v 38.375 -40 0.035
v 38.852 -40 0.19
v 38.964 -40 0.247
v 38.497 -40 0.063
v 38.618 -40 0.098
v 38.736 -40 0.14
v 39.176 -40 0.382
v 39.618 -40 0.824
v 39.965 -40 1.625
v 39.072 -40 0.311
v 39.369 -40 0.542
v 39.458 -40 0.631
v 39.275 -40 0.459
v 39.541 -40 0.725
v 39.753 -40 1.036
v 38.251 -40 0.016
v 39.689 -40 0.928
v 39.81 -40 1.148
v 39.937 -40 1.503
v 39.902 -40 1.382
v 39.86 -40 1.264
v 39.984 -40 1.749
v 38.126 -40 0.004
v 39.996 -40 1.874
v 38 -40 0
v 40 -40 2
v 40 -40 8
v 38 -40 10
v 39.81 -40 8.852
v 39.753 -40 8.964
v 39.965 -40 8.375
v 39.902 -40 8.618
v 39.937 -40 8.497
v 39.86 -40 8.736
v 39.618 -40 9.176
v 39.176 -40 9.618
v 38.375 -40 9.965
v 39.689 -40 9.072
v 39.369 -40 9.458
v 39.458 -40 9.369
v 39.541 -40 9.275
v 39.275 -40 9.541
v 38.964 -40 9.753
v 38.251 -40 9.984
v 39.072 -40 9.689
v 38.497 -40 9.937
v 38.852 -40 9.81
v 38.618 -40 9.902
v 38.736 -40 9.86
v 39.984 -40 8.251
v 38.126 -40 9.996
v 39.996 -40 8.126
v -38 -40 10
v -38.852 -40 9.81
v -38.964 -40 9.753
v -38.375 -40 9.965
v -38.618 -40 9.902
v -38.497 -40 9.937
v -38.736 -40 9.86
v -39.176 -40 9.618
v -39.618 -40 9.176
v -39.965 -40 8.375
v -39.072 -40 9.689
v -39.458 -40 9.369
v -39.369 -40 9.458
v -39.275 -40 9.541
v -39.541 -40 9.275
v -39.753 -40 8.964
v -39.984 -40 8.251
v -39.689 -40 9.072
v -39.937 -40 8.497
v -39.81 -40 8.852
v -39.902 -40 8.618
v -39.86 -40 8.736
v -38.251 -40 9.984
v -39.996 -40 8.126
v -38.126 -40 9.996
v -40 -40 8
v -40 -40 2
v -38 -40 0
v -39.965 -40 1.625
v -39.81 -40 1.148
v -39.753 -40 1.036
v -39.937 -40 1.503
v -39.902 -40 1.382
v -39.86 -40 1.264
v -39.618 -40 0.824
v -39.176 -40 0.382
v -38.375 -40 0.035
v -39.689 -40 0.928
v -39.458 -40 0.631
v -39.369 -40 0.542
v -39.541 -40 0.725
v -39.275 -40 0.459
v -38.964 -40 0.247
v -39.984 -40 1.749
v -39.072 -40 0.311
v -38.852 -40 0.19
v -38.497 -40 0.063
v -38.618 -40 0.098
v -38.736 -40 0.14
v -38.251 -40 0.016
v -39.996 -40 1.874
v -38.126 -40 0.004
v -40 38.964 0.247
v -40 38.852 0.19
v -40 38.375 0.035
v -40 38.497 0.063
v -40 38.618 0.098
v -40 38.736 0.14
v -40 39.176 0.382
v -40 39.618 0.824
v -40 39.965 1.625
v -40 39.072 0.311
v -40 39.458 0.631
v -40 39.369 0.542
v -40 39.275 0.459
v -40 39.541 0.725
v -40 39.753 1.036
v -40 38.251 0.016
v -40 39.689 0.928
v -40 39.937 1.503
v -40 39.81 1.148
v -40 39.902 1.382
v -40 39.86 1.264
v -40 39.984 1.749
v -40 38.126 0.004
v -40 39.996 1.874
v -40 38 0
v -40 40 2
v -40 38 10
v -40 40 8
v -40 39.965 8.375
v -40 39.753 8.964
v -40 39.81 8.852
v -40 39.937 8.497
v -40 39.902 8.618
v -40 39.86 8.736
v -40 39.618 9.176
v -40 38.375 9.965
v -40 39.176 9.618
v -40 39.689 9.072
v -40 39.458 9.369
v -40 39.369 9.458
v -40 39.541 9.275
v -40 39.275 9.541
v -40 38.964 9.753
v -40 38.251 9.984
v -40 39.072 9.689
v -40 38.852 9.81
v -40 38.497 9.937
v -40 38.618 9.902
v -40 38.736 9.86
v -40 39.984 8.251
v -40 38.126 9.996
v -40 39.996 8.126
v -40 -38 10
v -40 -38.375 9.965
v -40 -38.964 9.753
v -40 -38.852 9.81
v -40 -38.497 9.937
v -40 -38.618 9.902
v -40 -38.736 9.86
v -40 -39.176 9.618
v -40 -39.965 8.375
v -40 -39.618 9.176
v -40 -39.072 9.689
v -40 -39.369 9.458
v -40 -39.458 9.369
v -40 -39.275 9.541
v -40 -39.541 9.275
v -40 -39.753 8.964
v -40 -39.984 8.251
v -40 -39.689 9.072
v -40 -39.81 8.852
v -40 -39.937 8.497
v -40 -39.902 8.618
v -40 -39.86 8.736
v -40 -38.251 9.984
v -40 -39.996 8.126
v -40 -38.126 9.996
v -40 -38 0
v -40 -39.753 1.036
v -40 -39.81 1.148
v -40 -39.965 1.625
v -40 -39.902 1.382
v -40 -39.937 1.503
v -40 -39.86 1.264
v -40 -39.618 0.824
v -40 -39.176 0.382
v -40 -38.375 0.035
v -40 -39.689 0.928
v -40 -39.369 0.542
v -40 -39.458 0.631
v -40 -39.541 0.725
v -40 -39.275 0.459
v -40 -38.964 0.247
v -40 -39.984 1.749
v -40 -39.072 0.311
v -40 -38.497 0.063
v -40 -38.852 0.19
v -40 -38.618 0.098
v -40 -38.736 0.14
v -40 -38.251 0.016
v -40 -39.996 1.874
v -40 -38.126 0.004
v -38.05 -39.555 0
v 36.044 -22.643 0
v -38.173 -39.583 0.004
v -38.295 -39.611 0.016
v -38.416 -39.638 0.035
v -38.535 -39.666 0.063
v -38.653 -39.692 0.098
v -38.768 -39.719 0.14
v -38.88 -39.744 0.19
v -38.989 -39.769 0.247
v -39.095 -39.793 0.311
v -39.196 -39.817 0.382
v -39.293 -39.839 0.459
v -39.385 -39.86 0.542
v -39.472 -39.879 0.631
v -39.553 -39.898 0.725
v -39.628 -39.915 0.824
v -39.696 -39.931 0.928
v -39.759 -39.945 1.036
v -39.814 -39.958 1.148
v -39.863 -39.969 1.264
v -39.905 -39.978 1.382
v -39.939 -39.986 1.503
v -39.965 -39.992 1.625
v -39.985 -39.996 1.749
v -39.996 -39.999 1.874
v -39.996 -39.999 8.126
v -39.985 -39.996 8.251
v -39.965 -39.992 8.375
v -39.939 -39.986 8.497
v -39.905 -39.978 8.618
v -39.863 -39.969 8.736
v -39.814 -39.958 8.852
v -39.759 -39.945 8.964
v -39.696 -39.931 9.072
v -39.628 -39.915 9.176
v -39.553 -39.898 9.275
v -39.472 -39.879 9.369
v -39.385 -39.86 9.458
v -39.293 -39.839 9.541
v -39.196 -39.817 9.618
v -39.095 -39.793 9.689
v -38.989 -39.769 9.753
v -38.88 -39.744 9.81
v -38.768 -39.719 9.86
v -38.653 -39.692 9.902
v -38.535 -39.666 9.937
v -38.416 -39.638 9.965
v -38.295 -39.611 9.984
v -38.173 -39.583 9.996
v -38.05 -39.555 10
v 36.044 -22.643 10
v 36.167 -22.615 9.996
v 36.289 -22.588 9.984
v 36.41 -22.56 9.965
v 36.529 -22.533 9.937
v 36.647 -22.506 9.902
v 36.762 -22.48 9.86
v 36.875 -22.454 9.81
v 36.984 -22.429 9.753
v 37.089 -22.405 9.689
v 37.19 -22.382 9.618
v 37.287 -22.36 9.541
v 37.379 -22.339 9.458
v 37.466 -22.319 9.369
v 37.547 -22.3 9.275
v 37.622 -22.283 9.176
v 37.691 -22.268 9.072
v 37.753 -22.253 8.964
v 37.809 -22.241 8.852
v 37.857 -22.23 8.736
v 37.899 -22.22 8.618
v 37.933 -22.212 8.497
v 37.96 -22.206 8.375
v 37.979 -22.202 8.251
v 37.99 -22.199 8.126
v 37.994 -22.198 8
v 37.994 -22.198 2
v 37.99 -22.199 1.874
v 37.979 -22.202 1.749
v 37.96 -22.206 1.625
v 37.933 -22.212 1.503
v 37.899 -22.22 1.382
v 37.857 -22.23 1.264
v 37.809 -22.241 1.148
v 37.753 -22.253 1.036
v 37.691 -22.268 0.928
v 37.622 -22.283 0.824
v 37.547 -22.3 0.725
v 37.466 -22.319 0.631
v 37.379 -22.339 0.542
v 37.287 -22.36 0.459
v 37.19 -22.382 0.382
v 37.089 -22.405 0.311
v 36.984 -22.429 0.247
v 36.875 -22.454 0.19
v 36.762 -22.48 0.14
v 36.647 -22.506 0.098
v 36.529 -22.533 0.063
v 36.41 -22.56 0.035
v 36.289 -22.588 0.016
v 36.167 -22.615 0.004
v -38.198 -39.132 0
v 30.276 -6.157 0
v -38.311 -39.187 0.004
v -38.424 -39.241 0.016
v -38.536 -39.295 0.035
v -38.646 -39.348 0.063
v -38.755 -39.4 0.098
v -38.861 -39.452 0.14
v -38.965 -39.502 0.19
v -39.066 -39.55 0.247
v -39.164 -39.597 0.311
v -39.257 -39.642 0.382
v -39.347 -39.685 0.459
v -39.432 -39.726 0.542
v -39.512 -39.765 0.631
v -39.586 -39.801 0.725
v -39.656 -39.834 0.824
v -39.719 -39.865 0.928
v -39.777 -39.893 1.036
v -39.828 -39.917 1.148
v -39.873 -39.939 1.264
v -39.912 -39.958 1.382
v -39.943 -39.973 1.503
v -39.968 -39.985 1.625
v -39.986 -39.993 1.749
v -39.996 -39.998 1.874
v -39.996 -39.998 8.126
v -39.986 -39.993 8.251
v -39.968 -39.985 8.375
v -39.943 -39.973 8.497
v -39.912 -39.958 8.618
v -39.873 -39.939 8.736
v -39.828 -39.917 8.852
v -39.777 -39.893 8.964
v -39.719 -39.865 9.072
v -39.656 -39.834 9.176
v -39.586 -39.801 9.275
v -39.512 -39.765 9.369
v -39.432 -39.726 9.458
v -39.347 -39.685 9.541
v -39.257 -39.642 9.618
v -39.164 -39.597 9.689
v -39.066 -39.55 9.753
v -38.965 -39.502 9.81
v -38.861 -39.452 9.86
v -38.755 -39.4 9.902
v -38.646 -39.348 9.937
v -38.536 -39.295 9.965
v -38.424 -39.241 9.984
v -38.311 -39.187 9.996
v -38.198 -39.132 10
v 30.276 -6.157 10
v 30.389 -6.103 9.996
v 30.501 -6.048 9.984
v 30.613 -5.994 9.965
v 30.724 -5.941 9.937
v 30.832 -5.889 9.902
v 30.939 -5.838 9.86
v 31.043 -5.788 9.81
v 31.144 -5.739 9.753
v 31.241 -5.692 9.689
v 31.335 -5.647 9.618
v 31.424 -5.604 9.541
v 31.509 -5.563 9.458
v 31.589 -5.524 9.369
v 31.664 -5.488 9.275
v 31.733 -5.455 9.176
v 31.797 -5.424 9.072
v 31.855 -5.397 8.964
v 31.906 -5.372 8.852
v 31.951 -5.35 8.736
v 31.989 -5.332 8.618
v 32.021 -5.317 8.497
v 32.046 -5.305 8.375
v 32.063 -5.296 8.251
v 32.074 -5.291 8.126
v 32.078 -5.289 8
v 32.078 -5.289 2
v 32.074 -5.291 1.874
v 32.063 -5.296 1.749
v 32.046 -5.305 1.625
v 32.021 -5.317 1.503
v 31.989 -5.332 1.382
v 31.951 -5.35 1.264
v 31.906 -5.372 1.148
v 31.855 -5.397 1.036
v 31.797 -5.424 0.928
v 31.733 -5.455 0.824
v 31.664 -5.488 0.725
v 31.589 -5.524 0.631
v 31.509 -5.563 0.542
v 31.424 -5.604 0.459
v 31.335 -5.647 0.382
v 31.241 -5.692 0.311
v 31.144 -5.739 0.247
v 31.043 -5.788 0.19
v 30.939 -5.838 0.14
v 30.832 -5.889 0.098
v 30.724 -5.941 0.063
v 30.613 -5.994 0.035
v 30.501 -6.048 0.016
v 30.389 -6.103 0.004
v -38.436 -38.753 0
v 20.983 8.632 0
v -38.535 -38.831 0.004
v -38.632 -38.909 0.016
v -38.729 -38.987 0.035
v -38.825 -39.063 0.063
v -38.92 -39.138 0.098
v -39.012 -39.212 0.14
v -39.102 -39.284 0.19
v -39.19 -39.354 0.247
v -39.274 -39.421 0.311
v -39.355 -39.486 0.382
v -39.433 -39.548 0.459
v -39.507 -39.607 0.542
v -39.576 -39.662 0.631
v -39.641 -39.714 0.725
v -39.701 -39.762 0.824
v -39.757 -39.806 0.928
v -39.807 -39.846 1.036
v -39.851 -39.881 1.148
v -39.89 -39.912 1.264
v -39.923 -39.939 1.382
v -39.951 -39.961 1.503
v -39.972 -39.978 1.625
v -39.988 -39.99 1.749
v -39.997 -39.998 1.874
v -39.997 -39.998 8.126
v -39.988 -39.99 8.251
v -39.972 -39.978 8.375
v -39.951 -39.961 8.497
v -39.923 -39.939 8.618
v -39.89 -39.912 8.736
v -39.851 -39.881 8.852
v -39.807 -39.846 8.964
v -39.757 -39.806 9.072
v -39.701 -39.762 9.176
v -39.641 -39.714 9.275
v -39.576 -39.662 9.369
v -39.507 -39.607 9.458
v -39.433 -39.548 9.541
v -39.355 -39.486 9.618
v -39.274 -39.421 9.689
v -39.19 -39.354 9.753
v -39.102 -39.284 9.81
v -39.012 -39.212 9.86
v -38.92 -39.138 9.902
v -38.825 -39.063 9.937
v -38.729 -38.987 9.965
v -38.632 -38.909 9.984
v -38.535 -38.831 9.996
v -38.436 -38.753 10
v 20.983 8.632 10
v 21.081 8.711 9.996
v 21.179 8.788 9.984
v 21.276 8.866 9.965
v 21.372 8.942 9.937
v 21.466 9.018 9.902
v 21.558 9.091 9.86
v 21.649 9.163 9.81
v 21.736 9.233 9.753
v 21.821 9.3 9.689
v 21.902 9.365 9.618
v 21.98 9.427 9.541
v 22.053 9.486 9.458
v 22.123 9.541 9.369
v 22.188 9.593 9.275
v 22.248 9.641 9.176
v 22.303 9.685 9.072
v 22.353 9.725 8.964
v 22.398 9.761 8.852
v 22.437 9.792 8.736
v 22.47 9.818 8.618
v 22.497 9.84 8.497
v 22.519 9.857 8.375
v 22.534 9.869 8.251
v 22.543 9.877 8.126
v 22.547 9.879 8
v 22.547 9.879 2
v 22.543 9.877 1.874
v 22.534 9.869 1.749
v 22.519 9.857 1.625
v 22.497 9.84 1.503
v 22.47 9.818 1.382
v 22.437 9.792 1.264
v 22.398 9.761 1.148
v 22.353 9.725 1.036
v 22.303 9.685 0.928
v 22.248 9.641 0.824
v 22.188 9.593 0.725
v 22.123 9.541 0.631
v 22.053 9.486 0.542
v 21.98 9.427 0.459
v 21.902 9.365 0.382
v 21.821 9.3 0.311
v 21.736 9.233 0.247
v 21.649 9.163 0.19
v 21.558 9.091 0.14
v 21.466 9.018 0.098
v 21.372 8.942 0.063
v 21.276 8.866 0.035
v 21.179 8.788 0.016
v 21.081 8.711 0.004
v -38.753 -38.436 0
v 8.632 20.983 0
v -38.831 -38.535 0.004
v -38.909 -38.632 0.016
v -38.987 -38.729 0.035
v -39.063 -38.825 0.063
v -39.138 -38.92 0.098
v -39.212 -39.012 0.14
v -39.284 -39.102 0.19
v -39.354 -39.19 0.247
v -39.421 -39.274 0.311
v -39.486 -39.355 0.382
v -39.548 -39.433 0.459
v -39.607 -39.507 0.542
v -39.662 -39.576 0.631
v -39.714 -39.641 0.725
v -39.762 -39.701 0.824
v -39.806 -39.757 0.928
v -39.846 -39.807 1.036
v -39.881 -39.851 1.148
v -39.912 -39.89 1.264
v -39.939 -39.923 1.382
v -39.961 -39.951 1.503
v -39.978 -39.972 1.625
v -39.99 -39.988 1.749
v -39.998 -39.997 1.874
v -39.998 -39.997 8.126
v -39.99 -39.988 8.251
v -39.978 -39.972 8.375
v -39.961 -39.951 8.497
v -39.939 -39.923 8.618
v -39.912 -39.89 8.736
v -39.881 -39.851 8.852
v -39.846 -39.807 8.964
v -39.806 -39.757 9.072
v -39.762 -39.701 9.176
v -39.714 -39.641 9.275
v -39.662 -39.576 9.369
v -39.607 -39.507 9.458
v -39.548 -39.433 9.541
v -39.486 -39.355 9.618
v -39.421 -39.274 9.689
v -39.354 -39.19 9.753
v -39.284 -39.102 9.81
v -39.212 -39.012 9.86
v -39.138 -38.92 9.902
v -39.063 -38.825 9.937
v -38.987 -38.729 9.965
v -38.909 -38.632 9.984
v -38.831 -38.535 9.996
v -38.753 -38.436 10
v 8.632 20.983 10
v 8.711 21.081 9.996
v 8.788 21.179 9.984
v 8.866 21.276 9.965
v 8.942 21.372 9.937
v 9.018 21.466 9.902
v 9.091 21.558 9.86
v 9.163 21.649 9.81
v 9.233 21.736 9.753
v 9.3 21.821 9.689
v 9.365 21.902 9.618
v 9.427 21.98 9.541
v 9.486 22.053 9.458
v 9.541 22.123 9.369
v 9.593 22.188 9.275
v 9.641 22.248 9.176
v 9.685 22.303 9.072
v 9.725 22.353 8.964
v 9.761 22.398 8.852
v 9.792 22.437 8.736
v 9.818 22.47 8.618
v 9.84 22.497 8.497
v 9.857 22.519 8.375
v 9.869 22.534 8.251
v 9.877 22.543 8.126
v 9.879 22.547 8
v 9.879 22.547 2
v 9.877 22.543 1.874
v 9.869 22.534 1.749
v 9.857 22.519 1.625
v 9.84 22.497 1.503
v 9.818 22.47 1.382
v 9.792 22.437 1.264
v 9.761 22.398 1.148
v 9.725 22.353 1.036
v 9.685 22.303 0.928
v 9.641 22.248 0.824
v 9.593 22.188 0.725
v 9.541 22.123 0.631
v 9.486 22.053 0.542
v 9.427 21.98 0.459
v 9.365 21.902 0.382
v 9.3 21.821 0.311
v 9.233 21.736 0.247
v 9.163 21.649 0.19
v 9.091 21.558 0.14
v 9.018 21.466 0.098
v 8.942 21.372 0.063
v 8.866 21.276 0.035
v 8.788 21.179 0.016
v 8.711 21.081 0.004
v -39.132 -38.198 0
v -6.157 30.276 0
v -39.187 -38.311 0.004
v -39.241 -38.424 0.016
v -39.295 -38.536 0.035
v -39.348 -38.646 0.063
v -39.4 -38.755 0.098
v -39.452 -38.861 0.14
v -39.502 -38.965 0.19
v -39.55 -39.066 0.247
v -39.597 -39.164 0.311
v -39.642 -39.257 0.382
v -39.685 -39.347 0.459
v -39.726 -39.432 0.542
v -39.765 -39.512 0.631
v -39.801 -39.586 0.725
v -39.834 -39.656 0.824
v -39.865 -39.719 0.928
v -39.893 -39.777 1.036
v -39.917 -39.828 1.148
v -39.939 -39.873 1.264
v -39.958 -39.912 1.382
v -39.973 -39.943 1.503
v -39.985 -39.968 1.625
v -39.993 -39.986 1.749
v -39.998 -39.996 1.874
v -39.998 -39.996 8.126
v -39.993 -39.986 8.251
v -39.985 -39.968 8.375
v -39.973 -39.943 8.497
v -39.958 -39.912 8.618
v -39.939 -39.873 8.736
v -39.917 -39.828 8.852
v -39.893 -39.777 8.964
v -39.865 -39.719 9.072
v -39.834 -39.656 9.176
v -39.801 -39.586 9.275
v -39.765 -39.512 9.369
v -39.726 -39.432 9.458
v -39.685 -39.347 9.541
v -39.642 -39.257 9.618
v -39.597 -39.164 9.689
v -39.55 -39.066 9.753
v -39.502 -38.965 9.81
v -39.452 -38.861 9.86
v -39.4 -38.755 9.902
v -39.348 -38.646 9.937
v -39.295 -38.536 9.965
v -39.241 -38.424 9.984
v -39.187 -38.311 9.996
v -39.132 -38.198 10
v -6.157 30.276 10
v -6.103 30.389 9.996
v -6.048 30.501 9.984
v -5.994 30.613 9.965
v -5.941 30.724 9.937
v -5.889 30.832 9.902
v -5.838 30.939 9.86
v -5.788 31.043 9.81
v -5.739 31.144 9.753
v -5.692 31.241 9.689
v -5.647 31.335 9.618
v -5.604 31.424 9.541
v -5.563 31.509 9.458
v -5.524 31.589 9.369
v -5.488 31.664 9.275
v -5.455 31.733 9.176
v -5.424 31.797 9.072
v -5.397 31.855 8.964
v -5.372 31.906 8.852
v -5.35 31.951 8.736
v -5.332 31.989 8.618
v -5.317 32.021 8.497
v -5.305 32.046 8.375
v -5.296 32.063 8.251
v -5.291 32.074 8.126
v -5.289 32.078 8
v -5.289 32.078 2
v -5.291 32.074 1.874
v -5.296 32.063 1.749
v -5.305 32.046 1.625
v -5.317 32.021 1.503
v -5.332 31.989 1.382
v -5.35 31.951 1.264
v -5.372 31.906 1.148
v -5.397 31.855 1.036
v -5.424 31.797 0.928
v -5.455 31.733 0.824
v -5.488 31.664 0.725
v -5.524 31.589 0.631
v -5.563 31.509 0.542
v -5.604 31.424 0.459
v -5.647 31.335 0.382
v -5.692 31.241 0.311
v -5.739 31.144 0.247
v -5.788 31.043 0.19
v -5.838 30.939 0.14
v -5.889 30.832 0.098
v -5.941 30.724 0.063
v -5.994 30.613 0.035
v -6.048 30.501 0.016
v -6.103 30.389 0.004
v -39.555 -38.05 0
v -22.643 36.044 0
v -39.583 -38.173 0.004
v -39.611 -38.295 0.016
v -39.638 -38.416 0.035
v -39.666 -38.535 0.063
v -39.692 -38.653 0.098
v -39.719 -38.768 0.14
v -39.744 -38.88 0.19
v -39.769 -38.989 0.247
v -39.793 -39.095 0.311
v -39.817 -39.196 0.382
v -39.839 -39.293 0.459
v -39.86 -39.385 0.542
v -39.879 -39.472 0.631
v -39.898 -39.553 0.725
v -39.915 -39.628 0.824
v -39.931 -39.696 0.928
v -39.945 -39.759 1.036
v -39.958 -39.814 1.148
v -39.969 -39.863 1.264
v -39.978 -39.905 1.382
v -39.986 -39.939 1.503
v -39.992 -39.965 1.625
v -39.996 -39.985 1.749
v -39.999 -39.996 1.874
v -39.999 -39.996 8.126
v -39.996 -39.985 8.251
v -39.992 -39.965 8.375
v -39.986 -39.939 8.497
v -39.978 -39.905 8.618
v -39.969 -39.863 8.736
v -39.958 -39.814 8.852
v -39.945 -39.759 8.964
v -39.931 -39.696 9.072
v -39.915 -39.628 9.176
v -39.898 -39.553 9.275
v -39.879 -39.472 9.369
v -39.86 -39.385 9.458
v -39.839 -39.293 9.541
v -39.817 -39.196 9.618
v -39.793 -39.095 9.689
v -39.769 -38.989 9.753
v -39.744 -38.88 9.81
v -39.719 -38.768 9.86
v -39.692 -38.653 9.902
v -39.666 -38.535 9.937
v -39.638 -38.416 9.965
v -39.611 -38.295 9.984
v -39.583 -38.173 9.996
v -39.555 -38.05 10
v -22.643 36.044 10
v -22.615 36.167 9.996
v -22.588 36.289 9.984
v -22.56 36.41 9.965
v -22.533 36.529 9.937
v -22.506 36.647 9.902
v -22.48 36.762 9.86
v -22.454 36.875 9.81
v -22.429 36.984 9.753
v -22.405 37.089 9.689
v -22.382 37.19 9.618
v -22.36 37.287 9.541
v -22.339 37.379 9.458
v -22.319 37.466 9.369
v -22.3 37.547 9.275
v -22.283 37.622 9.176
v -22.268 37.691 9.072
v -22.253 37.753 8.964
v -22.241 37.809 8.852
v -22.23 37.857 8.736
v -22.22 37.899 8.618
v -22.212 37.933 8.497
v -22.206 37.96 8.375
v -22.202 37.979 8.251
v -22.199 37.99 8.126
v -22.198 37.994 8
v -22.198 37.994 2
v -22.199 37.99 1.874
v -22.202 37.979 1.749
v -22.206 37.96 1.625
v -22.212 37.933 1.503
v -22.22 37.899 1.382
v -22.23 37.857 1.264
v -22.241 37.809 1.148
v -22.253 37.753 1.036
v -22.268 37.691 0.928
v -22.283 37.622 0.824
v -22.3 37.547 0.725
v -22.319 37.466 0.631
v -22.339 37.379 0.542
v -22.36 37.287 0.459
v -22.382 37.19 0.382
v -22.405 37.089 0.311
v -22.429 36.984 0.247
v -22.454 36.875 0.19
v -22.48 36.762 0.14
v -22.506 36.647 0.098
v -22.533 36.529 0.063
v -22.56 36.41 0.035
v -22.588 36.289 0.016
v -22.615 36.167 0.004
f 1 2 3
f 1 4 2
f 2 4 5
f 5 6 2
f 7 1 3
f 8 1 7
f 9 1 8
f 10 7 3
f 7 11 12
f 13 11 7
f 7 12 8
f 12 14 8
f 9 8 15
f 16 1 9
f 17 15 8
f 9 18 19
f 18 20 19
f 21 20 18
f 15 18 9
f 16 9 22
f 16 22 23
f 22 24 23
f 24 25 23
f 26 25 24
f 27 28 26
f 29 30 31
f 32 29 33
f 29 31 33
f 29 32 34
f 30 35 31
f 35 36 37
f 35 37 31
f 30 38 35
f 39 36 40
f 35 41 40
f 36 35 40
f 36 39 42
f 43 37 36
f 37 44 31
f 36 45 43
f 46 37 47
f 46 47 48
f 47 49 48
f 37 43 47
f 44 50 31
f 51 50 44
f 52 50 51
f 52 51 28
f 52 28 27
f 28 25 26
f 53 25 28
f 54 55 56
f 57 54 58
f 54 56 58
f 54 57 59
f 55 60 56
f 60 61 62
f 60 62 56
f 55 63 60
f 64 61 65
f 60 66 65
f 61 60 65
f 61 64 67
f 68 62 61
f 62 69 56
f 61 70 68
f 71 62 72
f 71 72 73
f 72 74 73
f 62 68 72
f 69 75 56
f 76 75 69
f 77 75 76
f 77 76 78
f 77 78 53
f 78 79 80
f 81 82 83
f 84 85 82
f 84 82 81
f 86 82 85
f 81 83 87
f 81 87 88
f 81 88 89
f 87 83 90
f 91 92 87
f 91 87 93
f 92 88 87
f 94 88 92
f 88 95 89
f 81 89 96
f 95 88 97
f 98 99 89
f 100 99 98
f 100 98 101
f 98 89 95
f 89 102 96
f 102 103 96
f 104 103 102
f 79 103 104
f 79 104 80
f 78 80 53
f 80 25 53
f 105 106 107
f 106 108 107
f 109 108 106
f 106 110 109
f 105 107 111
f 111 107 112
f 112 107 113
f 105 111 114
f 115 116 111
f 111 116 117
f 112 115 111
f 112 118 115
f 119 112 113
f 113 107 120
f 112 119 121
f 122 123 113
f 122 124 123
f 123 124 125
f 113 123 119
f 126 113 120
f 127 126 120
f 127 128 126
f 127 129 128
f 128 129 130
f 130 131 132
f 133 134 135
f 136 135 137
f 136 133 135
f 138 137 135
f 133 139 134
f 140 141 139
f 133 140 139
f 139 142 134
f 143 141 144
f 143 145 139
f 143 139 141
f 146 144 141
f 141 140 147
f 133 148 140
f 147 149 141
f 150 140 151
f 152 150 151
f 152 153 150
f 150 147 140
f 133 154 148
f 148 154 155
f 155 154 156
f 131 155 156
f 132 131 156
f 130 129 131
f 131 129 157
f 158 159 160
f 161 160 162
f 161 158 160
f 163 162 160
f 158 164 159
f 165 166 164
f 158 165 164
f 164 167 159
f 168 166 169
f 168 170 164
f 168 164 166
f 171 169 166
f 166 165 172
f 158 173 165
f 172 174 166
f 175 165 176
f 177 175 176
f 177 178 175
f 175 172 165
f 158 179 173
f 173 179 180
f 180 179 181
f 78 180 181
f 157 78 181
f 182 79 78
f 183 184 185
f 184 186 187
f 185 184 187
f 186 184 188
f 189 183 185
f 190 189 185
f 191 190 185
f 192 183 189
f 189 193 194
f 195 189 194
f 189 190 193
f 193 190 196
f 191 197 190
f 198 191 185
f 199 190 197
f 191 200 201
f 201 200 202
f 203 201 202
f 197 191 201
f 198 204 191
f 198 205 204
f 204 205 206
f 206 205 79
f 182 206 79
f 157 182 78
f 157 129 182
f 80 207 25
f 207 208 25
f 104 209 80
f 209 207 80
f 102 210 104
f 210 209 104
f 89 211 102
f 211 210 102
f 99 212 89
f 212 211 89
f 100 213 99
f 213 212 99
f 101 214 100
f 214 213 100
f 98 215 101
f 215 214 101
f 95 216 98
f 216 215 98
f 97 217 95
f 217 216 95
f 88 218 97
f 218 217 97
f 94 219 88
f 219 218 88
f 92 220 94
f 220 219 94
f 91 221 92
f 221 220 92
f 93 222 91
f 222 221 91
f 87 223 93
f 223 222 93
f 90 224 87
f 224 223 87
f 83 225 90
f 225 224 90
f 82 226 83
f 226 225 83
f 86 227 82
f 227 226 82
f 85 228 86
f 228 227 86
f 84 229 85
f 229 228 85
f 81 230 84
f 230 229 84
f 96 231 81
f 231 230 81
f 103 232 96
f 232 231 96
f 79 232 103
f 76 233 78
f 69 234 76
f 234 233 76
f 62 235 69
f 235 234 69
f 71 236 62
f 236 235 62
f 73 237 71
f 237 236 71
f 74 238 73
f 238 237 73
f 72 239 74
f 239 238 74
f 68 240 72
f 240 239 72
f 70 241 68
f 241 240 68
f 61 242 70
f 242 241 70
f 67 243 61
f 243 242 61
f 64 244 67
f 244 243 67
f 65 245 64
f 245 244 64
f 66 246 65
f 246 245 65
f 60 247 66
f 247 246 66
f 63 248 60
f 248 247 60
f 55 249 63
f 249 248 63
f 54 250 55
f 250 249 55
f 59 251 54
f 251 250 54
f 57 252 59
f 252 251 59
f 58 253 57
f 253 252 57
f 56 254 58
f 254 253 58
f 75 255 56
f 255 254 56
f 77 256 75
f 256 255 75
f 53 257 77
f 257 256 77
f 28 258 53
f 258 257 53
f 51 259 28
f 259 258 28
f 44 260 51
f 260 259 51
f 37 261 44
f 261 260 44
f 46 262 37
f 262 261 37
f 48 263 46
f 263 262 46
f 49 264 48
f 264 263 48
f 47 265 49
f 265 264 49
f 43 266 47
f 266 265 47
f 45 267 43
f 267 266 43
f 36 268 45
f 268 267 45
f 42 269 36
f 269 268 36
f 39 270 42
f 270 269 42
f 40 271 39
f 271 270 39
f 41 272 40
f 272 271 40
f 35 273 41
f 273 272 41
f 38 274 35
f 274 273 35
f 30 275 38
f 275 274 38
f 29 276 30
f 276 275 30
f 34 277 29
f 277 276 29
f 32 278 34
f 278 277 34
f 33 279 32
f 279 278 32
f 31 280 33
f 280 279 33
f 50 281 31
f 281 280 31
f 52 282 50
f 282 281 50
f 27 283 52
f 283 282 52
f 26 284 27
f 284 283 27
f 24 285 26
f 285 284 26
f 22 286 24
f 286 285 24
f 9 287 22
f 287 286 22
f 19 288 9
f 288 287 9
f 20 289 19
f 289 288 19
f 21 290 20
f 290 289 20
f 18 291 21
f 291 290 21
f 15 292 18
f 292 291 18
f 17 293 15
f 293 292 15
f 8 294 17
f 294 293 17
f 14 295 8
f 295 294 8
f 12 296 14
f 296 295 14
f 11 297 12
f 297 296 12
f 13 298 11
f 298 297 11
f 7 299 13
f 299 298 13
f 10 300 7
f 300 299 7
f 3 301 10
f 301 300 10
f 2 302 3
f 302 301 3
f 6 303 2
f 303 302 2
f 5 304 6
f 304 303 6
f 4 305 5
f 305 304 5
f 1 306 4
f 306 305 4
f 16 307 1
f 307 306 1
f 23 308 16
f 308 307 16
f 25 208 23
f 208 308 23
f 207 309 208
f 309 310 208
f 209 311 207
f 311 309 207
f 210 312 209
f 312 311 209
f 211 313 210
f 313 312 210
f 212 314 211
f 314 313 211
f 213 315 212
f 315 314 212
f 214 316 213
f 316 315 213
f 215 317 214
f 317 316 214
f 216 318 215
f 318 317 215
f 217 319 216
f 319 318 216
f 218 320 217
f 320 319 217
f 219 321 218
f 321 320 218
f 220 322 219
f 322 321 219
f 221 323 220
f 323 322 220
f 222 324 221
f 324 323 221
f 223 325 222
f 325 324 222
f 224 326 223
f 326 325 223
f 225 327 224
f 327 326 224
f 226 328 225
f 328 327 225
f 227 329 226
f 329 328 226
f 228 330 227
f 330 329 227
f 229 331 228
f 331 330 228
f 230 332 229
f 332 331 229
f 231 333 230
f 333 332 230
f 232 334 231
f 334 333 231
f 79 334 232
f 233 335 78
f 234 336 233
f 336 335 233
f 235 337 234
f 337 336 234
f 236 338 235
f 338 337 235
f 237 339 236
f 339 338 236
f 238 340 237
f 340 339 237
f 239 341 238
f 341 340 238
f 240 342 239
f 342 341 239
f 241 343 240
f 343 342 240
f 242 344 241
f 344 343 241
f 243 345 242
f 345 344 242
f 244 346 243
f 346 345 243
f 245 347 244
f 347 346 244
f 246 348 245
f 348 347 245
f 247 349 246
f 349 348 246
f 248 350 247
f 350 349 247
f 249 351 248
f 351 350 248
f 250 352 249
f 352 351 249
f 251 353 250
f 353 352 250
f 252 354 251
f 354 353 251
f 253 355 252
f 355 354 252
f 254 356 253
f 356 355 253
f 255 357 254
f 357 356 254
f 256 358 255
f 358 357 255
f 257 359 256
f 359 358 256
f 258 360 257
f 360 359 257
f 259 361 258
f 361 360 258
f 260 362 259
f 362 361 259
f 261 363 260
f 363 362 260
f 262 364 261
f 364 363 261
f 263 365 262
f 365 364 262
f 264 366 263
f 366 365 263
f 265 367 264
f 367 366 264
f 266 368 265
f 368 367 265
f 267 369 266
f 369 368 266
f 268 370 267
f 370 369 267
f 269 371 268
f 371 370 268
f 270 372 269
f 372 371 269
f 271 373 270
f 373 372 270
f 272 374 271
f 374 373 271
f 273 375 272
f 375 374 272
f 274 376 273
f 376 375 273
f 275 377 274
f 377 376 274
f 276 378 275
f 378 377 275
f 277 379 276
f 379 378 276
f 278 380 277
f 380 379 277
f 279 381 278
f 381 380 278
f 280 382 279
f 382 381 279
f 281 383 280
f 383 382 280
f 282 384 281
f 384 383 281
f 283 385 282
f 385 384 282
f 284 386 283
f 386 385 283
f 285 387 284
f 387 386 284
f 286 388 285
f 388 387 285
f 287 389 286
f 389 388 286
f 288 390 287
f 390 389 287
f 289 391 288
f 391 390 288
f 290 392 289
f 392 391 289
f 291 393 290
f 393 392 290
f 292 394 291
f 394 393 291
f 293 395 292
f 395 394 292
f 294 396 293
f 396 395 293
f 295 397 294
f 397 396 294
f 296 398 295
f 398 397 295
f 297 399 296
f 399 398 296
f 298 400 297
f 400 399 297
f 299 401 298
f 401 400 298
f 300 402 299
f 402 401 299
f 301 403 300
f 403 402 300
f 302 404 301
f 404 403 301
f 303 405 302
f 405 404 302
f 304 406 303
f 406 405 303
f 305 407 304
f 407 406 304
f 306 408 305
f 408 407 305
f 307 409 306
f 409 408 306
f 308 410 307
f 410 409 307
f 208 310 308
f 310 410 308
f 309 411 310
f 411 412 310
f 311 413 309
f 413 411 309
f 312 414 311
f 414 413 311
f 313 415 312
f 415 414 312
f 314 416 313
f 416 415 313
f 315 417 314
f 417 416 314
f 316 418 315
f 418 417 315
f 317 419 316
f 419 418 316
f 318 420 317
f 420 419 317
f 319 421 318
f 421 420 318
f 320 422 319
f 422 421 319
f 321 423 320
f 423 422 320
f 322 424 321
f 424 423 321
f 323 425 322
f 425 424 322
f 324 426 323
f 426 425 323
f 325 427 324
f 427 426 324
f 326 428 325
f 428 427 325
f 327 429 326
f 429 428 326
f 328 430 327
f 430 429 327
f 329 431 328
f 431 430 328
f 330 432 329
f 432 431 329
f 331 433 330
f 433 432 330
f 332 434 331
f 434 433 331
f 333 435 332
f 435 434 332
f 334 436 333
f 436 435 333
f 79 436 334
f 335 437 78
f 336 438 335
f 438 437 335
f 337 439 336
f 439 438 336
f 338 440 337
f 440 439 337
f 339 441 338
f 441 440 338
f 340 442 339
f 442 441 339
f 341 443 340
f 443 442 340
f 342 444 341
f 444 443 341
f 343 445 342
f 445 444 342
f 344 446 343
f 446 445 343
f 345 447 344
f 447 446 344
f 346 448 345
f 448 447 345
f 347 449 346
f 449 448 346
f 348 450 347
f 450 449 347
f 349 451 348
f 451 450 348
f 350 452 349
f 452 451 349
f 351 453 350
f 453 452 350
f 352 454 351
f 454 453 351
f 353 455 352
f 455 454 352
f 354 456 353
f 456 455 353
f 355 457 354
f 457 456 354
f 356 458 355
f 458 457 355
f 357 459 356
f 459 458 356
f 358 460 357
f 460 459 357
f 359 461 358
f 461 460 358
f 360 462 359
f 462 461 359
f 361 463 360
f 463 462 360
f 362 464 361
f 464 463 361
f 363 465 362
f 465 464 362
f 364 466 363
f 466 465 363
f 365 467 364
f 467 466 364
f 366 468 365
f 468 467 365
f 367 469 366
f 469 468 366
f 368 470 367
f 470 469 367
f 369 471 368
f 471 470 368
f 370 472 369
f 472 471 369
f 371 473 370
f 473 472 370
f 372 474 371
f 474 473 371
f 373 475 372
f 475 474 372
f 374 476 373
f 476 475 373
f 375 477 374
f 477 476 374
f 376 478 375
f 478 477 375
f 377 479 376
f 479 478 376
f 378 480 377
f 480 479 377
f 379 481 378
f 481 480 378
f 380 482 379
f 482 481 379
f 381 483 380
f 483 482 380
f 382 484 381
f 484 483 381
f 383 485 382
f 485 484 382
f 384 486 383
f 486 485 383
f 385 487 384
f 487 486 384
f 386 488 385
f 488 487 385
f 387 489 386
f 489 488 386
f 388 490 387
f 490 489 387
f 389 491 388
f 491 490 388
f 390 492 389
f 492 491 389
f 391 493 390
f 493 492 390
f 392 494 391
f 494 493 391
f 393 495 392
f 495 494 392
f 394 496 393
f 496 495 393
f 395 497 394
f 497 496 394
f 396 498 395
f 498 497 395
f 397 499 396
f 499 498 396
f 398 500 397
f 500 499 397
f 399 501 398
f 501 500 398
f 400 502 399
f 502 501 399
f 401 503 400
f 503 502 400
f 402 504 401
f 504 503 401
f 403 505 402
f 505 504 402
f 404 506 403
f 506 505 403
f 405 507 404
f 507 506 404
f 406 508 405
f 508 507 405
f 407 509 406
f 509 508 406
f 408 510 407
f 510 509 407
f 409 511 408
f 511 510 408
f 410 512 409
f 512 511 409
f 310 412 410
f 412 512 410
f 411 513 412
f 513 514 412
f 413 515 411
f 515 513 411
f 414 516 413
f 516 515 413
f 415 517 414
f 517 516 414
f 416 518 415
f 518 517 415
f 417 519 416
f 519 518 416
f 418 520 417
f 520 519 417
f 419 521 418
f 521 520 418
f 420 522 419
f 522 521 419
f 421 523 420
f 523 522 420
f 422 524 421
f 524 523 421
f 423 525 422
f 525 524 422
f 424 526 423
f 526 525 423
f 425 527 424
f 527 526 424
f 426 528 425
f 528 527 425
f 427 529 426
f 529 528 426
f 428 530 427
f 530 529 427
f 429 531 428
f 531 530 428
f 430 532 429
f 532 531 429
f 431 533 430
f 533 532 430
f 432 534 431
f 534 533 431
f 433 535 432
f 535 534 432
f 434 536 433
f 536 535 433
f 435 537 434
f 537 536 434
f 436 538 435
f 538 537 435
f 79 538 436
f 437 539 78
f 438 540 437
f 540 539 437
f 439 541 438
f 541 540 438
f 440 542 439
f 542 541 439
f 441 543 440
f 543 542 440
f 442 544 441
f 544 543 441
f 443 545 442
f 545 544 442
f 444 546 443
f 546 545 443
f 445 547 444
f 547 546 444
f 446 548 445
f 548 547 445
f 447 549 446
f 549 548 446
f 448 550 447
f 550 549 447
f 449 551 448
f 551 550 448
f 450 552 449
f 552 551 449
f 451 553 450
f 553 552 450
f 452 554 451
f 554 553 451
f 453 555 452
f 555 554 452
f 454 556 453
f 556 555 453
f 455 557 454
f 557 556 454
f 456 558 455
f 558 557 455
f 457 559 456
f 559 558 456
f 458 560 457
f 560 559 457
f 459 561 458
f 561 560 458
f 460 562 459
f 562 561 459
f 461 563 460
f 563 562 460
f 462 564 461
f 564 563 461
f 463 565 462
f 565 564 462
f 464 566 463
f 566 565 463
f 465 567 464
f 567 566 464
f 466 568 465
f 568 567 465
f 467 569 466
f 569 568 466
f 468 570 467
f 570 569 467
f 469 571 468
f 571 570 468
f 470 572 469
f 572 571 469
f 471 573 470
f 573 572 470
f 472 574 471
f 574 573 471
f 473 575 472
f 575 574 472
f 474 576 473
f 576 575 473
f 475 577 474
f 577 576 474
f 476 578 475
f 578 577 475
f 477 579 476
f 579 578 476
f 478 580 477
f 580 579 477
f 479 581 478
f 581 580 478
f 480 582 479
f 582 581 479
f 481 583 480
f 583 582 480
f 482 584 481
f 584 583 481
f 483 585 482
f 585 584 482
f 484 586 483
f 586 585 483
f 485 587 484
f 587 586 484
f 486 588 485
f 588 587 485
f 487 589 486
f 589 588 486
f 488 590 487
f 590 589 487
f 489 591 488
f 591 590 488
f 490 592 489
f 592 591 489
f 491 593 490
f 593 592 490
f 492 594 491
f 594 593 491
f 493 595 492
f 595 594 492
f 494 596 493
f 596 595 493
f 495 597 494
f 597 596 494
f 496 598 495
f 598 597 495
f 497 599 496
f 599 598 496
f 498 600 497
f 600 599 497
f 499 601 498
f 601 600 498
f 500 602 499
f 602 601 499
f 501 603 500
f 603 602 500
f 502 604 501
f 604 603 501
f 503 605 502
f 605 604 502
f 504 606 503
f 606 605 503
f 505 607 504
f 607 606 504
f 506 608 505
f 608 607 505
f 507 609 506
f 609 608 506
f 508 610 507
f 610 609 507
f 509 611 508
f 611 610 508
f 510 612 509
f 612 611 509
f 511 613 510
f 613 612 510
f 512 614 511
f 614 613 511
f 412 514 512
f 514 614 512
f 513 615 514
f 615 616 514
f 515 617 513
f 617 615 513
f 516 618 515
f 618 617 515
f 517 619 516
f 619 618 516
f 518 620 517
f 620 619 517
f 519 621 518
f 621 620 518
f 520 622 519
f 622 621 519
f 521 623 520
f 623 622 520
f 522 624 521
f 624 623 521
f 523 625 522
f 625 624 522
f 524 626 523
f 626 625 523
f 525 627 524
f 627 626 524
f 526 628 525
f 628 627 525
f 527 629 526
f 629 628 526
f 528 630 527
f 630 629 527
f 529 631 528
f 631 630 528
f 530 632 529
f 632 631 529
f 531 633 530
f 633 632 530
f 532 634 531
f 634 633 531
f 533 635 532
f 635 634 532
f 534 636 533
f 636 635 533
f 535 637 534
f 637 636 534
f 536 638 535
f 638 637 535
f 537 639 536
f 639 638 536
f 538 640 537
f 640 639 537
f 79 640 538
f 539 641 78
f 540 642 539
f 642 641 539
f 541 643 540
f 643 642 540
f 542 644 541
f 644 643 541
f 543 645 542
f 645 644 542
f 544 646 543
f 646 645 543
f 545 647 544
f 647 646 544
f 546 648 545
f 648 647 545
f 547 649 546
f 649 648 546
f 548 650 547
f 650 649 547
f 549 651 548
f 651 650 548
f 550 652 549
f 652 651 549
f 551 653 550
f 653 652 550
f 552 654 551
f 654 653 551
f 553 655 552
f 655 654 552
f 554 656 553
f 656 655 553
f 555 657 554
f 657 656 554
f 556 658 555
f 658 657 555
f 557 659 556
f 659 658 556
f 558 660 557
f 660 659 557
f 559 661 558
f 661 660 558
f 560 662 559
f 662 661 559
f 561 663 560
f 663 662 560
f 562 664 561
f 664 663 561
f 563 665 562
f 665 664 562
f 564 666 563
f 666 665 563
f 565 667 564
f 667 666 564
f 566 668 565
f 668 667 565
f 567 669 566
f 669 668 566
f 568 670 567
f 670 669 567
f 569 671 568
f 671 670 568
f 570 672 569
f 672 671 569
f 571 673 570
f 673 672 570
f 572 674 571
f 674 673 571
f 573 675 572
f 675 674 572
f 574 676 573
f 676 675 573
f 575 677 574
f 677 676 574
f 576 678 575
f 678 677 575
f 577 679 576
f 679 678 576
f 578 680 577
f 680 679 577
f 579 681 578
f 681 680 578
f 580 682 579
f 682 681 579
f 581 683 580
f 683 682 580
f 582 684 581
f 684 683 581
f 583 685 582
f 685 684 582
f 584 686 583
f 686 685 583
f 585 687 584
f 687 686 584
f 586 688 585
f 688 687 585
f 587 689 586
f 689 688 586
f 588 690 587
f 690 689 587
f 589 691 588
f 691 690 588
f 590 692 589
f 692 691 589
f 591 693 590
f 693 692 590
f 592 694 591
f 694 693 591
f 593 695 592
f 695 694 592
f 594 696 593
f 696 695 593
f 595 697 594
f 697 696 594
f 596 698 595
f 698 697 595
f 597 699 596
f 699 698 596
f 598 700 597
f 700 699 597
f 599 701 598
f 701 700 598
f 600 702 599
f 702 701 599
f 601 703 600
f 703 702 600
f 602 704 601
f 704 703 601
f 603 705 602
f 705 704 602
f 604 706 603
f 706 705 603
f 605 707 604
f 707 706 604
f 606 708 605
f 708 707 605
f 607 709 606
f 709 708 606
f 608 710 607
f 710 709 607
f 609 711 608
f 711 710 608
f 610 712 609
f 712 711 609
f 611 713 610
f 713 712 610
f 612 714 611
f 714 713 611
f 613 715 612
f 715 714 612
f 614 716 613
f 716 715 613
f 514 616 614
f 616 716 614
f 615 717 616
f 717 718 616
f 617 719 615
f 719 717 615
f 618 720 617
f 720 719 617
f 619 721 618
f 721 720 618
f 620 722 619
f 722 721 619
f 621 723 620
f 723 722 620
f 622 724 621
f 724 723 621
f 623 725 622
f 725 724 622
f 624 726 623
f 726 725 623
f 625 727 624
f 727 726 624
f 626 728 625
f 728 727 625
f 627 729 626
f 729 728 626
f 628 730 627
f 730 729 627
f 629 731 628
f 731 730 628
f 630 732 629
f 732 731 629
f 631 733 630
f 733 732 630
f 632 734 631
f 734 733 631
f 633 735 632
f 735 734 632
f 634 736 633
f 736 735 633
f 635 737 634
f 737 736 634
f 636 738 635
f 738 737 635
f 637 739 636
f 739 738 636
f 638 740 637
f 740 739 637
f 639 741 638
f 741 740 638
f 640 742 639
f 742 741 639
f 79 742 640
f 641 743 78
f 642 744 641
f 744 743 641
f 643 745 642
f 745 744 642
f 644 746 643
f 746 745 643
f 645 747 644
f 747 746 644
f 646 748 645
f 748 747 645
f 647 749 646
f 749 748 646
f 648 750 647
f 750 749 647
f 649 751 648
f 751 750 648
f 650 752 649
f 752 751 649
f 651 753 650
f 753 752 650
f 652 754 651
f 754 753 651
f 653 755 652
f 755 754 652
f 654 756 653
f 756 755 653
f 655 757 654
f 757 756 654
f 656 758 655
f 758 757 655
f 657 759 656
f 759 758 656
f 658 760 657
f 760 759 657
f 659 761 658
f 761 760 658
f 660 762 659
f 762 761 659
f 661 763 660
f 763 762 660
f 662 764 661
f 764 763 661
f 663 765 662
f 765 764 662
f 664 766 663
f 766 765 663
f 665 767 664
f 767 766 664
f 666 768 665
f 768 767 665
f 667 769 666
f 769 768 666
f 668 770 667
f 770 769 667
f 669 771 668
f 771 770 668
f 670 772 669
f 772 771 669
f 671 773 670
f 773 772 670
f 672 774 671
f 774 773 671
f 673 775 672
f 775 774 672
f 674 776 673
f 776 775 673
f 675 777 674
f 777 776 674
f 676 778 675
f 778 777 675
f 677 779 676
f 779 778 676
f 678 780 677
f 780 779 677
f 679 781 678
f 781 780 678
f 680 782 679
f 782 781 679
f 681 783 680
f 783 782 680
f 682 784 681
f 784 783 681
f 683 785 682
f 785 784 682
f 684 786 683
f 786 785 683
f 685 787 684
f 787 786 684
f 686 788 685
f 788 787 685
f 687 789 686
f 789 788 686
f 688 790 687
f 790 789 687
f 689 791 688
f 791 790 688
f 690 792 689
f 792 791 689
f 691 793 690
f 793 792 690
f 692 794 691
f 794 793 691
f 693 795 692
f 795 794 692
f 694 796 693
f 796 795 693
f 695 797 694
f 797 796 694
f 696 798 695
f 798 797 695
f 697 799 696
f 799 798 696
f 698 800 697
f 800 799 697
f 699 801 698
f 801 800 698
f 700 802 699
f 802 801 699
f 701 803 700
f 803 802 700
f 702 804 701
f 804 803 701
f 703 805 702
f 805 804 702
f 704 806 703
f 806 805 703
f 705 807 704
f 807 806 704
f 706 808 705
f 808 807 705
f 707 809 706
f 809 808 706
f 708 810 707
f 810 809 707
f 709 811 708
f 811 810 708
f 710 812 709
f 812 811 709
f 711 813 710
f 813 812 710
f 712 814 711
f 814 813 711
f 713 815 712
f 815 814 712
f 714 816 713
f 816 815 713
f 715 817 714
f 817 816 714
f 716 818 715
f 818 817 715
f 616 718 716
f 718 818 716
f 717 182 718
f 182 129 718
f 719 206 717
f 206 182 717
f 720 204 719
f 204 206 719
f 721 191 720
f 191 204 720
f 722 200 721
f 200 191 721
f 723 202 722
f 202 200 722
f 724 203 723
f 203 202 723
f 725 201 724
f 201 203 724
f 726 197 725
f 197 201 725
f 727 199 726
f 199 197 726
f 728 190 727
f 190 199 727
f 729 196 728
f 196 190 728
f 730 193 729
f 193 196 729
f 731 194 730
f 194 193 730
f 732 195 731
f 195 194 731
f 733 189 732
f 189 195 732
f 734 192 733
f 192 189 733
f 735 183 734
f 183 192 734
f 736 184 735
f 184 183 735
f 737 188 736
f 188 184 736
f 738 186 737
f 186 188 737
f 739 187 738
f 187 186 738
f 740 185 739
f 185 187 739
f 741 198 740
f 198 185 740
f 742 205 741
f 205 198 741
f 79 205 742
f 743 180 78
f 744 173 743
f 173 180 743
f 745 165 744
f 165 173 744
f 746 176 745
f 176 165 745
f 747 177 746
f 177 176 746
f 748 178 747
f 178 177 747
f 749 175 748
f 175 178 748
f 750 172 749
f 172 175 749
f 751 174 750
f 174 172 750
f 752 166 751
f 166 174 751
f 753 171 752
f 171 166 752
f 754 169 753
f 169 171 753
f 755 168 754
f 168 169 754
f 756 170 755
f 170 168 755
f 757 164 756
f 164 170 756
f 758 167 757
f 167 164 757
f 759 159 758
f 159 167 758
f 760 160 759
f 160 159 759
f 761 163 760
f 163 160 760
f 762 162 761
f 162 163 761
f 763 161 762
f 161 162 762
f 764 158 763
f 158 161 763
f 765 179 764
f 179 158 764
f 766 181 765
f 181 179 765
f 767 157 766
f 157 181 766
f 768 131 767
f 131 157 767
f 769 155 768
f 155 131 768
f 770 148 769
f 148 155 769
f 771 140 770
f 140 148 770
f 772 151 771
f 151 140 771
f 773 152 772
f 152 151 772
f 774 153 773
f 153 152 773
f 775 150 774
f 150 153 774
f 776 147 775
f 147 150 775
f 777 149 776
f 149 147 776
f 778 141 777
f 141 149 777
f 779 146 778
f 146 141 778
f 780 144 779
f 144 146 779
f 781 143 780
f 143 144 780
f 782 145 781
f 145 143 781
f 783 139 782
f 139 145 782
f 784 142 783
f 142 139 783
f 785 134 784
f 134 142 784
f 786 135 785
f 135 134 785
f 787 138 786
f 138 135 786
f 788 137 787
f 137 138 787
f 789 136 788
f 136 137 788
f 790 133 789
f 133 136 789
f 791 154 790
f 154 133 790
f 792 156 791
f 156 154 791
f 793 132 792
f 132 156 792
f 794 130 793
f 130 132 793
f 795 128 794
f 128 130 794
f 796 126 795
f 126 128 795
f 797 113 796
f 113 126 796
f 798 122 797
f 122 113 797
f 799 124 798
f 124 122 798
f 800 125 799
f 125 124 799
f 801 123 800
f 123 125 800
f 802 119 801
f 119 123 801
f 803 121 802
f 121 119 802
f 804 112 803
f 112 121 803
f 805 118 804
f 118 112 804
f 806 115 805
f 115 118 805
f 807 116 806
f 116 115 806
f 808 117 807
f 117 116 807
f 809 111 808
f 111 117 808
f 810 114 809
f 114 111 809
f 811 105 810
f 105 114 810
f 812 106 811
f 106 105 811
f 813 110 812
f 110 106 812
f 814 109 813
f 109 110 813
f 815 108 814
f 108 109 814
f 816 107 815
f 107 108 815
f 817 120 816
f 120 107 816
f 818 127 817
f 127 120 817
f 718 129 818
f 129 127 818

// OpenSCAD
module pizza_cut(bottom_padding = 0 , diameter = 100, cut_angle = 0, start_angle = 0, end_angle = 45, extension = 1.5, thickness = 35, bore_multipier = 6, cone_height = 50, $fn = 100) {
    animation_angle = $t * 360;

    translate([thickness / 2, 0, bottom_padding + diameter / 2])
    rotate([0, 270, 0])
    rotate([0, 0, (animation_angle + cut_angle) % 360])
    difference() {
        linear_extrude(height = thickness) {
            union() {
            difference() {
                // Daire
                circle(d = diameter, $fn = $fn);
                
                // Pizza dilimi şekliq
                polygon(points = [
                    [0, 0], 
                    [diameter * extension * cos(start_angle), diameter * extension * sin(   start_angle)],
                    [diameter * extension * cos(end_angle), diameter * extension * sin(end_angle)]
                ]);
                        
            }
        
            circle(6,  $fn = $fn);
        }
    }
        shelve_cut(bore_multipier = bore_multipier, thickness = thickness);
    }
}

module circle_with_circle_cut(bottom_padding = 0 , diameter = 100, cut_angle = 0, start_angle = 0, end_angle = 45, extension = 1.5, thickness = 35, bore_multipier = 6, cone_height = 50, $fn = 100) {
    animation_angle = $t * 360;

    translate([thickness / 2, 0, bottom_padding + diameter / 2])
    rotate([0, 270, 0])
    rotate([0, 0, (animation_angle + cut_angle)])
    difference() {
        linear_extrude(height = thickness) {
            union() {
            difference() {
                // Daire
                circle(d = diameter, $fn = $fn);
 
                translate([21, 0, 0])
                scale([3, 4, 1])
                    circle(d = 13, $fn = 100); // Elips
                        
            }
        
            circle(6,  $fn = $fn);
        }
    }
        shelve_cut(bore_multipier = bore_multipier, thickness = thickness);
    }
}

module shelve_cut(bore_multipier = 1, thickness) {
        translate([bore_multipier / -2, bore_multipier / -2, -2]) 
            cube([bore_multipier, bore_multipier, thickness + 4]);
}


module circle_part(diameter = 80, height = 10, angle = 90, bottom_padding = 0, extension = 1.5) {
    translate([-(diameter / 2), -( diameter / 2)])
    rotate_extrude(angle=angle)
    offset(r=2, $fn=100) offset(r=-2) square([diameter,height]);
}


circle_part();

//circle_with_circle_cut(diameter = 80, thickness = 35, start_angle = -45, end_angle = 45); 
